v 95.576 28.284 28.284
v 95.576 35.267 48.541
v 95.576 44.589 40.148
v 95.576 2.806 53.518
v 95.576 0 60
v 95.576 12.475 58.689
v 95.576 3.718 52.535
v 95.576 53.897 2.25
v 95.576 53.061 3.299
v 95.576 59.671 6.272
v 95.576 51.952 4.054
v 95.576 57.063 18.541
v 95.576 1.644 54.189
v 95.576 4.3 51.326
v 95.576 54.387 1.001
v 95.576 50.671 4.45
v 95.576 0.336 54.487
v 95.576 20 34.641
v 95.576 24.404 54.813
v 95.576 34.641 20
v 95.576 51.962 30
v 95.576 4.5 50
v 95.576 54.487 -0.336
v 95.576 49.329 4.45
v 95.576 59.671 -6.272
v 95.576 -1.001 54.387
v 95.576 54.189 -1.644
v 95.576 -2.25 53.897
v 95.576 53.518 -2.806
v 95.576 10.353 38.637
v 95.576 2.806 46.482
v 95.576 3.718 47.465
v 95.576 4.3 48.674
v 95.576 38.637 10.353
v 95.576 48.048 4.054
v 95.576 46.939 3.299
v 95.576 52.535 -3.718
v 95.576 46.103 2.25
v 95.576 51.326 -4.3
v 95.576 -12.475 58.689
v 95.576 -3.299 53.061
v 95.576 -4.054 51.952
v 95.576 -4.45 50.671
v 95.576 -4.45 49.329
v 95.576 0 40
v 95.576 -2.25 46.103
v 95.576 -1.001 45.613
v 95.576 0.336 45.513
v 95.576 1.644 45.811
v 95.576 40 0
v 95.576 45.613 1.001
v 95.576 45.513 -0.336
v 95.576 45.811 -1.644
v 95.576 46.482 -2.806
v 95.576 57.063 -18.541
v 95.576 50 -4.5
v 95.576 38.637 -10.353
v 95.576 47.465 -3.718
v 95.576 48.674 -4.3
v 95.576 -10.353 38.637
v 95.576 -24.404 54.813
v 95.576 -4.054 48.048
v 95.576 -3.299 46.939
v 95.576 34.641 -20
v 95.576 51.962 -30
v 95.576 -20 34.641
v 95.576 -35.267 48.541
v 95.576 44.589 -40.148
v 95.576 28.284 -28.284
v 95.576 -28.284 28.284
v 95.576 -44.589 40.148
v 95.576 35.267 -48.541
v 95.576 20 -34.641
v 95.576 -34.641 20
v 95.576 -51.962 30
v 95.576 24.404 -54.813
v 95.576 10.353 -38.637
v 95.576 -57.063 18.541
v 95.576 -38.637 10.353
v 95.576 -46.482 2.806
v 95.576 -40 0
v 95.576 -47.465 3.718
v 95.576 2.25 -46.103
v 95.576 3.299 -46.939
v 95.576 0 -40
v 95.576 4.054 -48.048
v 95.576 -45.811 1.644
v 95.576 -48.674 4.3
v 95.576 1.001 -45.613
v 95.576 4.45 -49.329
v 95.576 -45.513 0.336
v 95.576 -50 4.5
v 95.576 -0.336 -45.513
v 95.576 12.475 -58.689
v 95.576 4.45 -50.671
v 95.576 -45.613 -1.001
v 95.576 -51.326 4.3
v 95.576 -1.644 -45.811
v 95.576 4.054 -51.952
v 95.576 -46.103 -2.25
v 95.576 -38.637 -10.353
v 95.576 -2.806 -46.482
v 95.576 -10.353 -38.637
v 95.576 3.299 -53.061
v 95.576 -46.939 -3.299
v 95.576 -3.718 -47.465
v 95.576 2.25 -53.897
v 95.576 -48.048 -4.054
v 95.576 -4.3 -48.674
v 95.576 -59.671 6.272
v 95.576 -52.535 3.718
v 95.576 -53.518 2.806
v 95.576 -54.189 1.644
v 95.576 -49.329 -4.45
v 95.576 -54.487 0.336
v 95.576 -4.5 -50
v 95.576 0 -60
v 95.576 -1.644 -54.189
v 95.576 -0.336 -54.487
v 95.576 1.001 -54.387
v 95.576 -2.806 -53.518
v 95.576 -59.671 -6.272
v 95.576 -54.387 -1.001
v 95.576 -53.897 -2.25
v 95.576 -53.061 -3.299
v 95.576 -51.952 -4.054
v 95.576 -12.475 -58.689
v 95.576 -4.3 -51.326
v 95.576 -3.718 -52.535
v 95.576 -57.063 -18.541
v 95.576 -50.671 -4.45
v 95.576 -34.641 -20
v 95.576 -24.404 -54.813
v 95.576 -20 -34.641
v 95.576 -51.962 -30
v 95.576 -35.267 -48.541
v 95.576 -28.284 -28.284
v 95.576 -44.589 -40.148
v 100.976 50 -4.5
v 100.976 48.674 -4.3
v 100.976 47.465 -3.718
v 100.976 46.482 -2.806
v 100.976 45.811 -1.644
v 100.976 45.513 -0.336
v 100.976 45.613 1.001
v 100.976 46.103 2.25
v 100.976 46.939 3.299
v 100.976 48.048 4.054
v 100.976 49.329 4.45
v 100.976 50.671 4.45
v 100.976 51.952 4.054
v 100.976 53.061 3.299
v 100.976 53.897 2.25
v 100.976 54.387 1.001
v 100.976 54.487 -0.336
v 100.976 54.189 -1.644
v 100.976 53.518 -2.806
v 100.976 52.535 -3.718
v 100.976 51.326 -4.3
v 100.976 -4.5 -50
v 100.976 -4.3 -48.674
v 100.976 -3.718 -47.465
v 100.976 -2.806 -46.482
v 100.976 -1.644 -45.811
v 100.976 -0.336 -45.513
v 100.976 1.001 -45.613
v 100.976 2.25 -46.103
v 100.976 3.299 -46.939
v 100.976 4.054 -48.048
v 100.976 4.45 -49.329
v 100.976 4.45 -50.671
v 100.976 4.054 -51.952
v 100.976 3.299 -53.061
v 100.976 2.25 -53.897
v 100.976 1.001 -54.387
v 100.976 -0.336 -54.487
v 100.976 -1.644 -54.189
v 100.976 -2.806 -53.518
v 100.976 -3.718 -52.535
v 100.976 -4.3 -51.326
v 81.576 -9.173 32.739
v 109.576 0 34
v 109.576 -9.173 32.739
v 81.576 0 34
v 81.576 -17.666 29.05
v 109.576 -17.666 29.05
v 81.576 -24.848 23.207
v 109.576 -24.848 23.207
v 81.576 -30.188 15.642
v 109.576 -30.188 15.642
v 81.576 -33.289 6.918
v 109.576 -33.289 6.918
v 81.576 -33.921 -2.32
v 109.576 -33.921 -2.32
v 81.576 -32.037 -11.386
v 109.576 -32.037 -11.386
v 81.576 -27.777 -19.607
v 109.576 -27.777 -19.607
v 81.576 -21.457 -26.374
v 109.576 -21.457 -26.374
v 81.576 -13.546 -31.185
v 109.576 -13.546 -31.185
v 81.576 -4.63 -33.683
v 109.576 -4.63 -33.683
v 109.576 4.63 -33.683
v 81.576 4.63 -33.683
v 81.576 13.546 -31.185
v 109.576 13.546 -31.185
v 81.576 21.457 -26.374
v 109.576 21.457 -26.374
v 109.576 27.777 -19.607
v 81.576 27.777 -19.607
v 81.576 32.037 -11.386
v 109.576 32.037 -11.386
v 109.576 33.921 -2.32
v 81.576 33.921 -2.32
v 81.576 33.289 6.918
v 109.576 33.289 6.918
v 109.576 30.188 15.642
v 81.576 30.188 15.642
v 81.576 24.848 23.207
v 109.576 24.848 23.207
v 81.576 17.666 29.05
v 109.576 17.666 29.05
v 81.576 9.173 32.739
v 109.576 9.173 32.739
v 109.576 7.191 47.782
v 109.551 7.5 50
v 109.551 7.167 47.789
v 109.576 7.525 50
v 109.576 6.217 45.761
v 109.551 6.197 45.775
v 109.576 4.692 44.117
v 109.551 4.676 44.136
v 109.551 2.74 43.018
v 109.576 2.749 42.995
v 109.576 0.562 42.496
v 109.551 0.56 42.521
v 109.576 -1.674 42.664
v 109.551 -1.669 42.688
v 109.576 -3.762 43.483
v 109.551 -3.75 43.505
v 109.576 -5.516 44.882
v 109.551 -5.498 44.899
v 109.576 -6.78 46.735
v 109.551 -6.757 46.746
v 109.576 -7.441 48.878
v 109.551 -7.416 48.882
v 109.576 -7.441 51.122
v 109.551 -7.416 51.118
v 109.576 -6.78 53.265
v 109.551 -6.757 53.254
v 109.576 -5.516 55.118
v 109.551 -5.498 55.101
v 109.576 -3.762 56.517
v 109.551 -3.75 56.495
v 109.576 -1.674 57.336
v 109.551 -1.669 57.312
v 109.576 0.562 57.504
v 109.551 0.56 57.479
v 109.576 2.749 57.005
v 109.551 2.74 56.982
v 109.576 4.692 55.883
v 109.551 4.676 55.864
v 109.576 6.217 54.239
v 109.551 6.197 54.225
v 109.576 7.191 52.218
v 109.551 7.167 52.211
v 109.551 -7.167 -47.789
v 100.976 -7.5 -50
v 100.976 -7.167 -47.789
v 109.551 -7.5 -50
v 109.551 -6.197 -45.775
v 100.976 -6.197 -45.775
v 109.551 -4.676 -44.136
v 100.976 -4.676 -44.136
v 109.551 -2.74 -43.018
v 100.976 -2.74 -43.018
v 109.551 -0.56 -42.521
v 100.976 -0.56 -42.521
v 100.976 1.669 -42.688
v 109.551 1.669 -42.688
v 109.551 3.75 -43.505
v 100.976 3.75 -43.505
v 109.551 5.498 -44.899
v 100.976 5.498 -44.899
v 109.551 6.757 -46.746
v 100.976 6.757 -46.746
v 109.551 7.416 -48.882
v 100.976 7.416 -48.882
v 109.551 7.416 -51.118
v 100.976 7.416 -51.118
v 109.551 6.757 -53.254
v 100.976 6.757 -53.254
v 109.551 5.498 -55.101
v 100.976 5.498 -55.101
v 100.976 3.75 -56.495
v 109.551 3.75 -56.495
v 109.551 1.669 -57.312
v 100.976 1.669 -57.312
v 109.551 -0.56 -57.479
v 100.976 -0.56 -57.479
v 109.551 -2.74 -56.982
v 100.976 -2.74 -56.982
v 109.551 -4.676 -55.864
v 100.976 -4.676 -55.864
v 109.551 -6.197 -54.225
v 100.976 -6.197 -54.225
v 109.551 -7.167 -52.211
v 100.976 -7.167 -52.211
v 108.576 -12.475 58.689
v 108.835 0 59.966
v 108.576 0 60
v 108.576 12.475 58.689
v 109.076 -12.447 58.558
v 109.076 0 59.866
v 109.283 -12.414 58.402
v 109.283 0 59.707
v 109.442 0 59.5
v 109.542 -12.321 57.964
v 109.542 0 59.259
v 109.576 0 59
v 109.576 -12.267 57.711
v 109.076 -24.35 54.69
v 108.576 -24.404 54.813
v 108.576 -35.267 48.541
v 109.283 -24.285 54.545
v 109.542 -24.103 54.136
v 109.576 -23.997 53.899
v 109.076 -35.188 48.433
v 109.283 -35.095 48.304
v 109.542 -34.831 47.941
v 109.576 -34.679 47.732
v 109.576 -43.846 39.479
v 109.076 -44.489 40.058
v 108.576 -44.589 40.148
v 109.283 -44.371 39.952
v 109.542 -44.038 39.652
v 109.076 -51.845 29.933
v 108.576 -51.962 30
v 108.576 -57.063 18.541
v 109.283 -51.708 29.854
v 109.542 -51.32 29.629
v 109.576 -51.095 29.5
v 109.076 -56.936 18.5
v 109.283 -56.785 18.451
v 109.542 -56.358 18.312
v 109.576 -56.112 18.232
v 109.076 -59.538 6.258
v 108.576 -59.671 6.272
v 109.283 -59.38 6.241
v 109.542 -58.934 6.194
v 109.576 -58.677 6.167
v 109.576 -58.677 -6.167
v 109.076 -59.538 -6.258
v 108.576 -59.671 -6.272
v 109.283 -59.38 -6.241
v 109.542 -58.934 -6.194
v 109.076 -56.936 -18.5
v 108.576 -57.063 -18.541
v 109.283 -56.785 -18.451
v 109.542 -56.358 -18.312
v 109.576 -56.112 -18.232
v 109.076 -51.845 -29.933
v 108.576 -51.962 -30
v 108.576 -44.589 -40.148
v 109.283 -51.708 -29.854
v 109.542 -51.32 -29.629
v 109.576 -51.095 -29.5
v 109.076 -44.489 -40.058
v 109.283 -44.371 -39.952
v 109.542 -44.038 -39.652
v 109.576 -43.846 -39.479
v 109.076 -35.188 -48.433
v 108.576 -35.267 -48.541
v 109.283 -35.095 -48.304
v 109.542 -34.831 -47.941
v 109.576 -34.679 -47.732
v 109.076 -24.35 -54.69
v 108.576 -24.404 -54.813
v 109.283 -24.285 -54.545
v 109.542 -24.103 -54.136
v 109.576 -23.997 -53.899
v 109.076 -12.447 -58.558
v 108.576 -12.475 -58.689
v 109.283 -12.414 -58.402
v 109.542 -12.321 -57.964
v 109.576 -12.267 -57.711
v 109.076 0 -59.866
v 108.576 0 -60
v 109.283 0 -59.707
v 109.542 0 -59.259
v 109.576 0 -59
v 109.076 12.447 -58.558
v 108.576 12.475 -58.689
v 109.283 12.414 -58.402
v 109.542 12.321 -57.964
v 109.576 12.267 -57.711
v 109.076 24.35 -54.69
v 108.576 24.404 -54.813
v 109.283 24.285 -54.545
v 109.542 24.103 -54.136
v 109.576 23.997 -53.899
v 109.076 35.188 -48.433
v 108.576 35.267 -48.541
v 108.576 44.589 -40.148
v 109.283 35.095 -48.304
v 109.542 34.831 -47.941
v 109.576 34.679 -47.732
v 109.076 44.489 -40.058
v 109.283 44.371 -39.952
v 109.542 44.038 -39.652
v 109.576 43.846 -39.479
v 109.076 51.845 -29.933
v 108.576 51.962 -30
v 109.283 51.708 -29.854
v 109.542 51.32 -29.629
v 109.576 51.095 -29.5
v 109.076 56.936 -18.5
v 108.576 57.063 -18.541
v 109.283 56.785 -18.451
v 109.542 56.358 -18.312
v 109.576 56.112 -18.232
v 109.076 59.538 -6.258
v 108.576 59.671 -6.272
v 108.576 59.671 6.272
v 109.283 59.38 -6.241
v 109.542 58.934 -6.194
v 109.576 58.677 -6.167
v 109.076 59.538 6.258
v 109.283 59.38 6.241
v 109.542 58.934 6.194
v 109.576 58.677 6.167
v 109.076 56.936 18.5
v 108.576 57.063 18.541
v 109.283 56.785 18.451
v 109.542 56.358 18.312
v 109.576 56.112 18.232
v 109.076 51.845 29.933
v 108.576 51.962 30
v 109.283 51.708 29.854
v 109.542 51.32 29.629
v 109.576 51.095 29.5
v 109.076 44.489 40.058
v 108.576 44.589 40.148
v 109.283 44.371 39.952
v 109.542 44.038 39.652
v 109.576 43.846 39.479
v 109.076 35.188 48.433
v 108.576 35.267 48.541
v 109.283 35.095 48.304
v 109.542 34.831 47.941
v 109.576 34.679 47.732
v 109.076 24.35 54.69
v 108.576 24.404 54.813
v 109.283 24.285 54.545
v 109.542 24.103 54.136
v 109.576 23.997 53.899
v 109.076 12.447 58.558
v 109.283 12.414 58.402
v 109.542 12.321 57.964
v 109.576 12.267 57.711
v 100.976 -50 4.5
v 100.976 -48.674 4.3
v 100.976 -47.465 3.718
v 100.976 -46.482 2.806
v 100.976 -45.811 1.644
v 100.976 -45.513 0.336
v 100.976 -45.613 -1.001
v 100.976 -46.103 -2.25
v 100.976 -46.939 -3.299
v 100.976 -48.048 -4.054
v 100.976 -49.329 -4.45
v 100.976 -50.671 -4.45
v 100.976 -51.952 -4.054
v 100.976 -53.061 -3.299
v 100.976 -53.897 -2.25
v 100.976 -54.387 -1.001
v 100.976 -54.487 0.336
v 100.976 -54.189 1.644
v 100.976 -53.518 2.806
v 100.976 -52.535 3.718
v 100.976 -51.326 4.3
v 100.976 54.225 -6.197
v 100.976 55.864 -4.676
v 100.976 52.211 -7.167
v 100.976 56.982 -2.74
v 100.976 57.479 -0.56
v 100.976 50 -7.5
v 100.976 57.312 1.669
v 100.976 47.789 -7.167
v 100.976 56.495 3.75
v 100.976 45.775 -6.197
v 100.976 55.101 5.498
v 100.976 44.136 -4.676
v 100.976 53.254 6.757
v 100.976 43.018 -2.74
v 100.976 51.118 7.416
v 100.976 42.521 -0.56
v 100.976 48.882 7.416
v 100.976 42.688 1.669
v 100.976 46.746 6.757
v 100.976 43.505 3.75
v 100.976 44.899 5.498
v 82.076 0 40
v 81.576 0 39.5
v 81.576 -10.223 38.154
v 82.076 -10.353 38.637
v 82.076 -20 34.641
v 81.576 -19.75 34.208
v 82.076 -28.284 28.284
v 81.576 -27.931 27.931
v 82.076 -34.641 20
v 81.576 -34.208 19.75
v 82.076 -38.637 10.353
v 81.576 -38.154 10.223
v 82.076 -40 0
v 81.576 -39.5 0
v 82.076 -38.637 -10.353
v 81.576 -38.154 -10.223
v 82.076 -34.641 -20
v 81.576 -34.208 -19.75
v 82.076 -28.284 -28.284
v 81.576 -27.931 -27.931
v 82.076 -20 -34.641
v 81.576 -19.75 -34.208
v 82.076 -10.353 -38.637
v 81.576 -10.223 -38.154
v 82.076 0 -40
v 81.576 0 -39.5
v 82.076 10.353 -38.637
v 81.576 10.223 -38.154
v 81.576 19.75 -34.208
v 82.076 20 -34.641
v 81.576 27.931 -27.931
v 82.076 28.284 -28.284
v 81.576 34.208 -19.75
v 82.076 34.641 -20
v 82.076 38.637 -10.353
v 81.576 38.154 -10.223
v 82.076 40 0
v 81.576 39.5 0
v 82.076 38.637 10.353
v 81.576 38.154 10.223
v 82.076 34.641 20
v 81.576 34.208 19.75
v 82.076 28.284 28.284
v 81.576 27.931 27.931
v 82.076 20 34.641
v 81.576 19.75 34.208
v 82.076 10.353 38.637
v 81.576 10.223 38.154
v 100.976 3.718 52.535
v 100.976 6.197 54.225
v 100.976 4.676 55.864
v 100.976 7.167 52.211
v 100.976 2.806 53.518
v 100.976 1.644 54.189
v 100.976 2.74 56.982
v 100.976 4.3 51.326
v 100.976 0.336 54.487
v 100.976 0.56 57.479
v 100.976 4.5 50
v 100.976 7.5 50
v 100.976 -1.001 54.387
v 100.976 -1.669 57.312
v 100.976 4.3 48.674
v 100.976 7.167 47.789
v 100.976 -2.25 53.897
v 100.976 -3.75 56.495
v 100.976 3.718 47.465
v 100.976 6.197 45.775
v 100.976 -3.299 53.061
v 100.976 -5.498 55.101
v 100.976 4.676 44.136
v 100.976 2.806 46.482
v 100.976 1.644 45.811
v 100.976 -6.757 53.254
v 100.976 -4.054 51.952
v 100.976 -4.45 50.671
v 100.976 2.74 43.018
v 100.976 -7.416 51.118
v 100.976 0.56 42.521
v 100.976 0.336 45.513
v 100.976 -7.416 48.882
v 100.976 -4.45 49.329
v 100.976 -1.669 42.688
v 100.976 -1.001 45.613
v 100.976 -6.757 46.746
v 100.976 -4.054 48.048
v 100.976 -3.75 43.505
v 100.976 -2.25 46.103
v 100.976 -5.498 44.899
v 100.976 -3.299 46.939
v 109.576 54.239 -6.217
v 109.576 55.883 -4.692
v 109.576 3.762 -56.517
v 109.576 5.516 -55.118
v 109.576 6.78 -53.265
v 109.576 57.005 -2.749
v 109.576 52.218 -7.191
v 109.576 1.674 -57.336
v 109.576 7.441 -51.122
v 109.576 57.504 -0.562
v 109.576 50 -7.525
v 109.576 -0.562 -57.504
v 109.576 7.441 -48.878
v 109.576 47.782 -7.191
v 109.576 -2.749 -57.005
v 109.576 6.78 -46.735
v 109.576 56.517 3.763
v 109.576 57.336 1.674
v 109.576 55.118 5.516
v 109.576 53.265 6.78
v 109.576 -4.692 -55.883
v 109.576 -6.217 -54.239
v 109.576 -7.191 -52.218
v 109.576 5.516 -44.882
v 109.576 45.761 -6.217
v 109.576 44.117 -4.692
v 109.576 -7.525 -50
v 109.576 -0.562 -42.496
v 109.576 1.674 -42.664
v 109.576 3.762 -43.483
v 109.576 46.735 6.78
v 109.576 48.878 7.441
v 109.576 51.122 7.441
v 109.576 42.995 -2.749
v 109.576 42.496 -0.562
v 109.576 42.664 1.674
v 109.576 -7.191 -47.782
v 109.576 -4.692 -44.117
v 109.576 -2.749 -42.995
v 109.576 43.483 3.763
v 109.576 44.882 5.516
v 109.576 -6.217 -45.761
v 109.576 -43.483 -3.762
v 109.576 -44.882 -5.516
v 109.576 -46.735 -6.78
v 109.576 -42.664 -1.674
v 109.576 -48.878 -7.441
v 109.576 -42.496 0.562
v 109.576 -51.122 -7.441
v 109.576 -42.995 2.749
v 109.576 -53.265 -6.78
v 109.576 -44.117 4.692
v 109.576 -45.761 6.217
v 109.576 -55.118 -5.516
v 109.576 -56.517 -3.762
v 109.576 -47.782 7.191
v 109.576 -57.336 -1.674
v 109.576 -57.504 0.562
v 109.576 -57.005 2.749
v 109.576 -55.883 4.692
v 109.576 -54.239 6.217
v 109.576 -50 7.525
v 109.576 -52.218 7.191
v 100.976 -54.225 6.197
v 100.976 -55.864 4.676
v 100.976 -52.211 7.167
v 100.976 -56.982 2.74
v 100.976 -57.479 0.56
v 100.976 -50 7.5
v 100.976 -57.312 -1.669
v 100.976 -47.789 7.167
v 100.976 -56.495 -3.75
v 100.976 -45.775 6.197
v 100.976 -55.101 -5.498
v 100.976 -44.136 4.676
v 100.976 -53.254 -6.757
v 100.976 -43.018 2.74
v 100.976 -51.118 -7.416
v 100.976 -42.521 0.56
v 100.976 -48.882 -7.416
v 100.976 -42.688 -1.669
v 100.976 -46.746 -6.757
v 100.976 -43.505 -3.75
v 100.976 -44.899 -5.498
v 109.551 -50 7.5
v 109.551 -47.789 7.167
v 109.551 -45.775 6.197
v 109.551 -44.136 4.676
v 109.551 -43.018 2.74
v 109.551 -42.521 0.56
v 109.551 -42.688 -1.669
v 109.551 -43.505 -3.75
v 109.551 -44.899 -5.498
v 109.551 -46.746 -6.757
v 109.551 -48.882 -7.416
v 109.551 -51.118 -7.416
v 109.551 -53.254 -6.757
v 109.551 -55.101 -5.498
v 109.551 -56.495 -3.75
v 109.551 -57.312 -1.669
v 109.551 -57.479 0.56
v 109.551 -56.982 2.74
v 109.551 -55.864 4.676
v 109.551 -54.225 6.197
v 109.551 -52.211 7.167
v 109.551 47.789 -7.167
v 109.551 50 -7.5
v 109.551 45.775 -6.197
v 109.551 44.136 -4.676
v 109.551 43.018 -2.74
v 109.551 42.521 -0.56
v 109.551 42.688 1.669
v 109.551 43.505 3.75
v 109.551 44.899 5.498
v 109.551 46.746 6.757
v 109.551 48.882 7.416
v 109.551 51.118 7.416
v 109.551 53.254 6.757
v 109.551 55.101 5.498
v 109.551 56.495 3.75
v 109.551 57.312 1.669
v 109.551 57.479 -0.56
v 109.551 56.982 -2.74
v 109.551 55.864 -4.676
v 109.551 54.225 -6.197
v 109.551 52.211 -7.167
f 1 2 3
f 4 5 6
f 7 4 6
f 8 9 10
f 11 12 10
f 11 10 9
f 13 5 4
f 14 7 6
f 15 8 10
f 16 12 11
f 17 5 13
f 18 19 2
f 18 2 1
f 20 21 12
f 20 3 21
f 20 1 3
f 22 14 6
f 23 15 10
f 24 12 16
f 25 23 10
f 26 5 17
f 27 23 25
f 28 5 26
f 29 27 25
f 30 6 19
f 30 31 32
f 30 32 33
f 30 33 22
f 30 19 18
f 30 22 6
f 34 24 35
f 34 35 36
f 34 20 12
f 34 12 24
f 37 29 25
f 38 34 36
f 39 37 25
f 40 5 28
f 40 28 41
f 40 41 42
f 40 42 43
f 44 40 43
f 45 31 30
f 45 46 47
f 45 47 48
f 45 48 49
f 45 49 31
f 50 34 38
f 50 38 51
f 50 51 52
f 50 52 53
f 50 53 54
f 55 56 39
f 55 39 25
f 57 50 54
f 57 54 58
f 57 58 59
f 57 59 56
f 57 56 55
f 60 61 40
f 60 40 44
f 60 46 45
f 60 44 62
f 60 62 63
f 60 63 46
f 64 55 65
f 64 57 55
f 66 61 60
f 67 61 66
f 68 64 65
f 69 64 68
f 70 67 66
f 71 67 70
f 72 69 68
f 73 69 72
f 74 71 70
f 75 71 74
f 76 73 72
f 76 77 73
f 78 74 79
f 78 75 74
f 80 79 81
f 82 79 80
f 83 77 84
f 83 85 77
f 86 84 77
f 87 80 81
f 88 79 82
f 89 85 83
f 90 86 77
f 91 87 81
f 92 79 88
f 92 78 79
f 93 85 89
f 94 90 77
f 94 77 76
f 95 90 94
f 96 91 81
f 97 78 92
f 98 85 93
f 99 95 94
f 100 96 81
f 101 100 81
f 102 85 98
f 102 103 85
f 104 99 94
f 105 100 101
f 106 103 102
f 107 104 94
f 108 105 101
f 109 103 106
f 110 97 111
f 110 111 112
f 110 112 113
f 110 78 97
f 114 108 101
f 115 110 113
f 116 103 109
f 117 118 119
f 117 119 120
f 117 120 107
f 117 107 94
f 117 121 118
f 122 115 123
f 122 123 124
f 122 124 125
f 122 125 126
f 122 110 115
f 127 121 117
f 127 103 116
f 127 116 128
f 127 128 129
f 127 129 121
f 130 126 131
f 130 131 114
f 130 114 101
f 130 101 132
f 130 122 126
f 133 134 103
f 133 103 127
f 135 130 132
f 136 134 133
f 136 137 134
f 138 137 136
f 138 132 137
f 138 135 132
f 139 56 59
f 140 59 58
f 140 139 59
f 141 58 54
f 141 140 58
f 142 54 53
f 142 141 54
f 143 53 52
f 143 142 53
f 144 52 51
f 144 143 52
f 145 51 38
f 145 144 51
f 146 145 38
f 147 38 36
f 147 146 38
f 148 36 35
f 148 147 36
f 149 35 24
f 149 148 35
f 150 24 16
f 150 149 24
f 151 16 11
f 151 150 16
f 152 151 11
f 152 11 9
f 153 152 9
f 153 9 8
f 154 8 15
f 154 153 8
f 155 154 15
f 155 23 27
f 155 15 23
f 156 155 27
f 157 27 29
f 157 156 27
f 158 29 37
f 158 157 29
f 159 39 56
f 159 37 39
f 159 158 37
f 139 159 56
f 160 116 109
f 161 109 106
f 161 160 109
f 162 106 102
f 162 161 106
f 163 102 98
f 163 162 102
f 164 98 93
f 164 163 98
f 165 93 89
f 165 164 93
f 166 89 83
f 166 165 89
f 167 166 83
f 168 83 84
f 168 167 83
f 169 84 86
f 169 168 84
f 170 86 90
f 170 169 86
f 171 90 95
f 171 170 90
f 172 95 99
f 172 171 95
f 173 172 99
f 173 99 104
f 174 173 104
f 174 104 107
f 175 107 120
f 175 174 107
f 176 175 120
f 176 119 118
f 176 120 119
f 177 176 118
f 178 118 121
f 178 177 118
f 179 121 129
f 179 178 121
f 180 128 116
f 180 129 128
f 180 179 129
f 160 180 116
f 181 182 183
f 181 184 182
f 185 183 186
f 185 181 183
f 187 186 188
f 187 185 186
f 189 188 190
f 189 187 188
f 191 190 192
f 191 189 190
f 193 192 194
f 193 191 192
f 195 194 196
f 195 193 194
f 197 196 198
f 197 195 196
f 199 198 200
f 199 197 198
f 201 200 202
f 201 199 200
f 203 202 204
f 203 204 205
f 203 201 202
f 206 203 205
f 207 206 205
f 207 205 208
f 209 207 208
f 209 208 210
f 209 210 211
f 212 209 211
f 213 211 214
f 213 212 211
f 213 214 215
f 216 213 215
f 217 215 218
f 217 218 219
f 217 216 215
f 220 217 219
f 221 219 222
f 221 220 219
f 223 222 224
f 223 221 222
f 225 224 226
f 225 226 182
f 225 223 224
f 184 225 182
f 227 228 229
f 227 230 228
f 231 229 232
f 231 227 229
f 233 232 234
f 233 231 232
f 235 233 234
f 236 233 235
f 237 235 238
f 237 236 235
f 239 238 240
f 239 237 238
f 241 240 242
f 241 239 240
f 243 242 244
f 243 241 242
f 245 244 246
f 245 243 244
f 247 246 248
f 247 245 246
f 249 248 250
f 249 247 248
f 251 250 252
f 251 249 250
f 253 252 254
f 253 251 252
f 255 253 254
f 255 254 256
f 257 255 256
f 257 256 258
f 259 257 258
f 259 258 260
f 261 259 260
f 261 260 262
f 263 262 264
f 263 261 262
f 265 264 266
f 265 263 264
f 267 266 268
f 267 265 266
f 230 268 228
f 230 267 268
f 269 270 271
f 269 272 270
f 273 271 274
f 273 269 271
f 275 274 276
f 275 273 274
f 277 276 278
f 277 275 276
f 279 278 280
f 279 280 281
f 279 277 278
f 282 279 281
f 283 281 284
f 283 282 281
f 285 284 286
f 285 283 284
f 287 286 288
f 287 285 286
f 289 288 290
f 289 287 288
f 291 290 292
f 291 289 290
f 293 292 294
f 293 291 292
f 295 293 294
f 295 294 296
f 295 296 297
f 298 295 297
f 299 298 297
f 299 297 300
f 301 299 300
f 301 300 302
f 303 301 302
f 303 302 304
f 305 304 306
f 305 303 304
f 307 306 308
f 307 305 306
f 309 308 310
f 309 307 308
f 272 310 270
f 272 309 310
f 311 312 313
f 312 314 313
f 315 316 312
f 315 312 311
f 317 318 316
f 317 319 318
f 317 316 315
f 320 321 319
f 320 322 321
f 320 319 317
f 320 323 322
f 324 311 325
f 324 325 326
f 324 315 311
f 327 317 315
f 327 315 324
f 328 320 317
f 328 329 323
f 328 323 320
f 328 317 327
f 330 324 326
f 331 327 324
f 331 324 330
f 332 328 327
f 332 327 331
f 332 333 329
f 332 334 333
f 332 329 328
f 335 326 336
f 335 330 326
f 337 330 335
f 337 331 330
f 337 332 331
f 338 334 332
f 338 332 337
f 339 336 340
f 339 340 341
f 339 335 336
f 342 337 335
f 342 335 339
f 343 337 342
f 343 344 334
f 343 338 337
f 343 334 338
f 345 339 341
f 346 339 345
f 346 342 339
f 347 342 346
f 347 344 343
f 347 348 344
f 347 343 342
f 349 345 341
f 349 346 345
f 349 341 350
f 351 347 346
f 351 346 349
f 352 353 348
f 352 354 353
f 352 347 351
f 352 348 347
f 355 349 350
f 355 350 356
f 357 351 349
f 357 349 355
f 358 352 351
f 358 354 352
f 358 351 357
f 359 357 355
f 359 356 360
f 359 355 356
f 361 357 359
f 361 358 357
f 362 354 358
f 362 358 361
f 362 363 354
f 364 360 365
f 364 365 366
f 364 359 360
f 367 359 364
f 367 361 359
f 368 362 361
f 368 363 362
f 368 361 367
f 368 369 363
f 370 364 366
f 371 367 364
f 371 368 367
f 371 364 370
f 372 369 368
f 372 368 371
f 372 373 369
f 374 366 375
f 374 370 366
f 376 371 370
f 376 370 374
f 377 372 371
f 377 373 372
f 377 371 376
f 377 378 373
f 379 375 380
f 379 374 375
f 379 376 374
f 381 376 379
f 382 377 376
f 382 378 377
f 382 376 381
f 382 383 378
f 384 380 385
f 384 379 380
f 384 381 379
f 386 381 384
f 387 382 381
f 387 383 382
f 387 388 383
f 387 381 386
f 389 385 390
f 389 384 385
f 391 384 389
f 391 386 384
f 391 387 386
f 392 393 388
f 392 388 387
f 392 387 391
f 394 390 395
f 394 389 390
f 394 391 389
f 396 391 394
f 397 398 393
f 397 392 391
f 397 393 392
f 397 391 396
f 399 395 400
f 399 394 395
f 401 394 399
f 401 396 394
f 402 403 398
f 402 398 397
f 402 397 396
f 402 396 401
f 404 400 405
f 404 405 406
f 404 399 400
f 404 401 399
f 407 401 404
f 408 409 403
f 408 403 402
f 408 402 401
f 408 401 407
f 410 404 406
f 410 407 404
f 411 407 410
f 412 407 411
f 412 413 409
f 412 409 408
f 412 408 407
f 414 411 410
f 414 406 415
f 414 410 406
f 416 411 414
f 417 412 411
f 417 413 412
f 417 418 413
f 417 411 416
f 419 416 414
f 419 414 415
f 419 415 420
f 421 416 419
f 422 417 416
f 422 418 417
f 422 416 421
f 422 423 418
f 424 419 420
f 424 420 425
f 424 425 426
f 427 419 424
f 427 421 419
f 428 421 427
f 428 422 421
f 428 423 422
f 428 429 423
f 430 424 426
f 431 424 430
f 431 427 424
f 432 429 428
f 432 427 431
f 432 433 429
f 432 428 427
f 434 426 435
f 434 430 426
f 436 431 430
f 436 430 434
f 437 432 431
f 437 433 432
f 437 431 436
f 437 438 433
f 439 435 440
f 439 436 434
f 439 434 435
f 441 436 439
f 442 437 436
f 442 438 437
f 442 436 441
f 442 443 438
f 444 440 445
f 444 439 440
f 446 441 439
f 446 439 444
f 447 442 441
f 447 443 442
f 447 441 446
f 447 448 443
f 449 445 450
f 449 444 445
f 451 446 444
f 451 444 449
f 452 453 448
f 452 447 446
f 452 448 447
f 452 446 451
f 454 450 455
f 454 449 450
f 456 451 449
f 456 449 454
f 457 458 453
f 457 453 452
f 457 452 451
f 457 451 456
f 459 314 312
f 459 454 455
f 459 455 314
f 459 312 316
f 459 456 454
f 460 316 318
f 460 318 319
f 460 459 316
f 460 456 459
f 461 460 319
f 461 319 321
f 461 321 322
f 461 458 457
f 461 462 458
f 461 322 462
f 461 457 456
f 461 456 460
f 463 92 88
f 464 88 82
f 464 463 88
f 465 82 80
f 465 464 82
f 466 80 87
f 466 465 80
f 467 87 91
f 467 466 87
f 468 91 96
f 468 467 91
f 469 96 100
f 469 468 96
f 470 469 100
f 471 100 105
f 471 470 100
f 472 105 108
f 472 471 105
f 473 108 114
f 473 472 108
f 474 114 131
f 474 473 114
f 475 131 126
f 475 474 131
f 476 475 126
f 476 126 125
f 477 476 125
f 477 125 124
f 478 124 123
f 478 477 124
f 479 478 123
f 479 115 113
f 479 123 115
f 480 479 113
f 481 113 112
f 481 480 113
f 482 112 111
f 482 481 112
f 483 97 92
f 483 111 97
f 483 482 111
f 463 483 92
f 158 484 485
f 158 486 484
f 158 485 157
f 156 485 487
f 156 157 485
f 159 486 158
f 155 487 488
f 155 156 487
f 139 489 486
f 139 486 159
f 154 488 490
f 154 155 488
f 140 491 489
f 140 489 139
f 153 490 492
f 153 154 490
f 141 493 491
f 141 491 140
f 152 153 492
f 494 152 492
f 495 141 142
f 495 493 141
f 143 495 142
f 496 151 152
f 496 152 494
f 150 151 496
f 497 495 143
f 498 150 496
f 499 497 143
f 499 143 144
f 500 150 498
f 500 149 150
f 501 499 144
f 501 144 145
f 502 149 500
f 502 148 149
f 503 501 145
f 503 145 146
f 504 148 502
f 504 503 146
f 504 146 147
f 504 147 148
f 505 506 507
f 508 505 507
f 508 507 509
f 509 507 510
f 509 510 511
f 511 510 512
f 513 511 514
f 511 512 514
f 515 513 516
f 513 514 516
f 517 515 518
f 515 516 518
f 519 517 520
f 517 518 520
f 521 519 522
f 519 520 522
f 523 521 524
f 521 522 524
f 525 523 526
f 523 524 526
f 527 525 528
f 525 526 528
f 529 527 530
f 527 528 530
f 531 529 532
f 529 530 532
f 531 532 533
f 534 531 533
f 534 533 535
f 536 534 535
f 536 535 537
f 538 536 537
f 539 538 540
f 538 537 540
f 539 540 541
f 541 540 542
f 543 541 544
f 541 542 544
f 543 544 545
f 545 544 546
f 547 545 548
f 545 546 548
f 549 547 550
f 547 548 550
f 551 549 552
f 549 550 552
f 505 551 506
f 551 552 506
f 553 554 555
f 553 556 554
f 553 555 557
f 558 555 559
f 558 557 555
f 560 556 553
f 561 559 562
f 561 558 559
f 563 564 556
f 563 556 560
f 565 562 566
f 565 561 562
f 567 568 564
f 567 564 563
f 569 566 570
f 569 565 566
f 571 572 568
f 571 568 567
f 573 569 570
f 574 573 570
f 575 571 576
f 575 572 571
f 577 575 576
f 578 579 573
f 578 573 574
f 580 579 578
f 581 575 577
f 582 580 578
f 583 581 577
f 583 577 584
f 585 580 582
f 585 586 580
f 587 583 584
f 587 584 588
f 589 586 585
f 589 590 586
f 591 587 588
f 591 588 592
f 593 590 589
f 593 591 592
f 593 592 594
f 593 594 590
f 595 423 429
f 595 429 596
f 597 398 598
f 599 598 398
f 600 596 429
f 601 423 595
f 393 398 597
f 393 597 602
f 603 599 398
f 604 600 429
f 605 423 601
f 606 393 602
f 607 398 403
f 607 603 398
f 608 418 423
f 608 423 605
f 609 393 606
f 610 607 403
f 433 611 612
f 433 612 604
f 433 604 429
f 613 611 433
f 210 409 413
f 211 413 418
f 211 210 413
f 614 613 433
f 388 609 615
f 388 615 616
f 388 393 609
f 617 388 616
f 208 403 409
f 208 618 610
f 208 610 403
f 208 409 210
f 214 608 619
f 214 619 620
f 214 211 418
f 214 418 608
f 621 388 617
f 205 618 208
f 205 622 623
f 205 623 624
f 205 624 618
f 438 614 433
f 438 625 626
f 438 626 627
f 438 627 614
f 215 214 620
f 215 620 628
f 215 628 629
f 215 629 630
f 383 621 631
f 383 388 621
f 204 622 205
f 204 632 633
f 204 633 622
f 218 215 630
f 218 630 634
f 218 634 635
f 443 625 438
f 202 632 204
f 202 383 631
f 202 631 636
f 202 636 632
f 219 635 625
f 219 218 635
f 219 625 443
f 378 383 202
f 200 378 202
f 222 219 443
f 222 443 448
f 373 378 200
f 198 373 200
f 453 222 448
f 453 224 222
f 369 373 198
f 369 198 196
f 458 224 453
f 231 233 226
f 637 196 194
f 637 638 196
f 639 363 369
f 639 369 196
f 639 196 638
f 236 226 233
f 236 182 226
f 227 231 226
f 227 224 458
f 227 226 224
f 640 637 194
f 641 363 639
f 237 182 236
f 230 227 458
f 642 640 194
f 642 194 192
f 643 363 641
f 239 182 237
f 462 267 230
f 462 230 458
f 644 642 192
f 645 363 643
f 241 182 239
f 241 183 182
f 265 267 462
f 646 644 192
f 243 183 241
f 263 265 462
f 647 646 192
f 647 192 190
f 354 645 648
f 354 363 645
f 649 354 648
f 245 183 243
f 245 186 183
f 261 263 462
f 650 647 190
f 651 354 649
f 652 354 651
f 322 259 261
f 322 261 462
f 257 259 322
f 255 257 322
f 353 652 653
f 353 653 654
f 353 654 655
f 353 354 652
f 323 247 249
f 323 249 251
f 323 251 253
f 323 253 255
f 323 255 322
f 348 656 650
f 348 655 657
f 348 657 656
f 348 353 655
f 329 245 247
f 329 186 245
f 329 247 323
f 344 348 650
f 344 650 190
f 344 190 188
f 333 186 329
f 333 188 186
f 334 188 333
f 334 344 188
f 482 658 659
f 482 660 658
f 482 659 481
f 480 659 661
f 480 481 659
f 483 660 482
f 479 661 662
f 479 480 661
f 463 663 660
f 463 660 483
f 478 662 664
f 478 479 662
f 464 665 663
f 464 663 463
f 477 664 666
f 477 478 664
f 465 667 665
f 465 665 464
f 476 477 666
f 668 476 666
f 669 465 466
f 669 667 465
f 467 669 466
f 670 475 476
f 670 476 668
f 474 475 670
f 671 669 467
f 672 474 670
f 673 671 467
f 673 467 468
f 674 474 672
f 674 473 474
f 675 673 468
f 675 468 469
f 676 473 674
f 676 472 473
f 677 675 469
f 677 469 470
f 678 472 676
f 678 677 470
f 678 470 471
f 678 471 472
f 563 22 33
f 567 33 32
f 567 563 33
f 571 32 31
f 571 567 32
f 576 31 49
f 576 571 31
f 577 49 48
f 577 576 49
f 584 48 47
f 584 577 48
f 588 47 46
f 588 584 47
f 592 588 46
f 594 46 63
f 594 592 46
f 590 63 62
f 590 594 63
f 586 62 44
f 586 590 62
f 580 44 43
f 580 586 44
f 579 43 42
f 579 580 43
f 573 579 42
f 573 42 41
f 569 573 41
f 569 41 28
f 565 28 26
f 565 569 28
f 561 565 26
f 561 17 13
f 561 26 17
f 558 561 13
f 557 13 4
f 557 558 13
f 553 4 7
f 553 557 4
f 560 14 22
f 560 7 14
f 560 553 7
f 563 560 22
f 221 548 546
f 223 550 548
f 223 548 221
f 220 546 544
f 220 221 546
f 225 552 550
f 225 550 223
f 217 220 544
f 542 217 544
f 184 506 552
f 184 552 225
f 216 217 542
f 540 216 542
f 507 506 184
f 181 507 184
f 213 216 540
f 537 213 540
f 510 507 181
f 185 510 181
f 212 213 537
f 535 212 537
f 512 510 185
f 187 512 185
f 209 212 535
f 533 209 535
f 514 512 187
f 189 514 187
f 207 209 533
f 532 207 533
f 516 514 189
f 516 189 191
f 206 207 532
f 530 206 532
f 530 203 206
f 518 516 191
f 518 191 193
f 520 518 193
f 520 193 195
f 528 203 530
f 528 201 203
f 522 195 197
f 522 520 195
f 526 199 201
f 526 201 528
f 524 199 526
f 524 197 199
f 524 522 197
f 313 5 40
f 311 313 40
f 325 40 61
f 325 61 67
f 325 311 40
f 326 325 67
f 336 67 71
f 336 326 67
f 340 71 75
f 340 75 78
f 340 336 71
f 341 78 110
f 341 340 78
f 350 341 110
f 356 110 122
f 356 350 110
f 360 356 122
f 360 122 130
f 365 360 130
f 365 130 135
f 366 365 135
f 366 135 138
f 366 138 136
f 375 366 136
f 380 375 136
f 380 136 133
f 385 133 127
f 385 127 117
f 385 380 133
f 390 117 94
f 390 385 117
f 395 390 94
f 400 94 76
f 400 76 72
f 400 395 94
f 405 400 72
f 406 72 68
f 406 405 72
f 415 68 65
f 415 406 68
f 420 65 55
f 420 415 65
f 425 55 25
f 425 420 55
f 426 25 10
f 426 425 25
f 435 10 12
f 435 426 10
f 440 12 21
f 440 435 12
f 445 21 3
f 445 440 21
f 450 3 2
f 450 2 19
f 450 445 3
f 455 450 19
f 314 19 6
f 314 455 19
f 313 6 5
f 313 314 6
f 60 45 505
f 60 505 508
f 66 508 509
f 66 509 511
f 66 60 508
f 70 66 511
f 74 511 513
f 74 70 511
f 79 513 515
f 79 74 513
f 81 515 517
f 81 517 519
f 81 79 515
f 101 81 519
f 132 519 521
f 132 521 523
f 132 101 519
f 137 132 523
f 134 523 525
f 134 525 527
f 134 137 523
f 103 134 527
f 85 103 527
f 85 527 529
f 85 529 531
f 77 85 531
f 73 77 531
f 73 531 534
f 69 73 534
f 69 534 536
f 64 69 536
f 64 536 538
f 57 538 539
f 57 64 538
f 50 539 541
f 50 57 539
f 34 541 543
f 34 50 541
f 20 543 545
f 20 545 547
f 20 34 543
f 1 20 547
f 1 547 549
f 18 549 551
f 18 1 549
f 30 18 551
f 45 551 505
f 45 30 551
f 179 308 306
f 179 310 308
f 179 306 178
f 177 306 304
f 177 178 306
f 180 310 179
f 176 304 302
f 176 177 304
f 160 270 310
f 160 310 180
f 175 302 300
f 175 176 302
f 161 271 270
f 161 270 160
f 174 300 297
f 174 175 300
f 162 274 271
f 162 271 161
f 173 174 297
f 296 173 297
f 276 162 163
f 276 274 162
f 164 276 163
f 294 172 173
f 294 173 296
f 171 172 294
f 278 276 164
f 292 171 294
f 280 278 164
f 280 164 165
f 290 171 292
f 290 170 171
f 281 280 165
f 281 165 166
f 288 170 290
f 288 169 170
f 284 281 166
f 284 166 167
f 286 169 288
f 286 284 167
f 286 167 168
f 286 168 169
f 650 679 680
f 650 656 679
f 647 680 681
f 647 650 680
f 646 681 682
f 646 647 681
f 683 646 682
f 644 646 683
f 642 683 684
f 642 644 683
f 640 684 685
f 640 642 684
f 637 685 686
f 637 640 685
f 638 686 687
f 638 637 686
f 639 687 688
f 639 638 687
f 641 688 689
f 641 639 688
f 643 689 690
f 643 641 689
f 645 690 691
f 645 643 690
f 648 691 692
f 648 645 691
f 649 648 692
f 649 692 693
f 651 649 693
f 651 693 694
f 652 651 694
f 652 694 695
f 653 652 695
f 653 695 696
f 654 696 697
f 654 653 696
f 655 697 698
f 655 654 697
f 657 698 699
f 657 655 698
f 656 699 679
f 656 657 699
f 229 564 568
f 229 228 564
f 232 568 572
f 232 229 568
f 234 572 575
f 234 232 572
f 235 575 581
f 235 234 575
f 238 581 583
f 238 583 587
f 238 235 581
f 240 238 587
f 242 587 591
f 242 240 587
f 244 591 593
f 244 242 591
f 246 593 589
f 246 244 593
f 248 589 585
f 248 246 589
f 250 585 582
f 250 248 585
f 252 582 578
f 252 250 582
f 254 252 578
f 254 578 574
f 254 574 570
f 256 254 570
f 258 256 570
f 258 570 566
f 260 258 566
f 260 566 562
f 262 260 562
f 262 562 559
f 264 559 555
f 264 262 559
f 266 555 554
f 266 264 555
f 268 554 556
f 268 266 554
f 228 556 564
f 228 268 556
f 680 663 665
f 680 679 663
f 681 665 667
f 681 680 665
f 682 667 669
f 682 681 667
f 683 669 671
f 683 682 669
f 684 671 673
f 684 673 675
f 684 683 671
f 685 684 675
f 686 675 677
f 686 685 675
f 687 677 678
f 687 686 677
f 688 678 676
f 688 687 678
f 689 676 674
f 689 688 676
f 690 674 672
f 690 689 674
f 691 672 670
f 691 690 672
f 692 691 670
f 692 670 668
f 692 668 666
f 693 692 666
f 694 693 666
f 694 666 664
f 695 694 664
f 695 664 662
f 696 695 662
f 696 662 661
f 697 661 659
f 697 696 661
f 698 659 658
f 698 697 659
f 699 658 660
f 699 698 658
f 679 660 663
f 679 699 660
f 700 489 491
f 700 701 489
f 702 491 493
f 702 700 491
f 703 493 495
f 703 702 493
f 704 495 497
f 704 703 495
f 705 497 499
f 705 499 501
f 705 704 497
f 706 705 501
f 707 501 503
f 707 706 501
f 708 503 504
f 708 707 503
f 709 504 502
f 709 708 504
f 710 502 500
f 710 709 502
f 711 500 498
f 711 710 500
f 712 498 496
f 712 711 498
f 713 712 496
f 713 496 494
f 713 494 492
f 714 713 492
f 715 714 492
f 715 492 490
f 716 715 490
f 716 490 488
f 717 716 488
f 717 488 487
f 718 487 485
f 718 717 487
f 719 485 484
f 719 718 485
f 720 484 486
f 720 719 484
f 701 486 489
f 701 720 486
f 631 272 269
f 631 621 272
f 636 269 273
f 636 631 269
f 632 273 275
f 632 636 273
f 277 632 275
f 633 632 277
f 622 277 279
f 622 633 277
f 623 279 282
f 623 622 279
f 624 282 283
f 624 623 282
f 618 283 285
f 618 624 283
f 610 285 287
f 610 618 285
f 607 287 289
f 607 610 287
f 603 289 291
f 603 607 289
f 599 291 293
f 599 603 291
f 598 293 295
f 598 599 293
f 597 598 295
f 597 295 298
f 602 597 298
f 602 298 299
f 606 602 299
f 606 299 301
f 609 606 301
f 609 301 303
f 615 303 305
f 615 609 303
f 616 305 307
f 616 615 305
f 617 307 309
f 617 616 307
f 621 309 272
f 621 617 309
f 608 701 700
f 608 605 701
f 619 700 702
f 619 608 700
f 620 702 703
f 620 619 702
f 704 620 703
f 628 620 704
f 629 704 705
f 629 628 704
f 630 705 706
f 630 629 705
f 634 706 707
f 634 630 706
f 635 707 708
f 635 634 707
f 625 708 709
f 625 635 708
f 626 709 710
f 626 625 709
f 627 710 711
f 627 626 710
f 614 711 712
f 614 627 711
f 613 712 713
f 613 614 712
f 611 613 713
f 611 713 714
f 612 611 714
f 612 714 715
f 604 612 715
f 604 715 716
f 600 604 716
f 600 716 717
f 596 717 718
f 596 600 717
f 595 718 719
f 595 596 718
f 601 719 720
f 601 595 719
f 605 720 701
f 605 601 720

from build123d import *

# Parameters (mm, degrees)
CONG_1_R                     = 1
CHANFREIN1_SIZE              = 0.5
R_P_TITION_CIRCULAIRE1_COUNT = 4


with BuildPart() as part:
    # Esquisse1 → Révolution1 (revolve)
    with BuildSketch(Plane.XY, mode=Mode.PRIVATE) as r_volution1_sk:
        Polygon((81.575845111, 40), (95.575845111, 40), (95.575845111, 60), (109.575845111, 60), (109.575845111, 34), (81.575845111, 34), align=None)
    revolve(r_volution1_sk.sketch.rotate(Axis((0, 0, 0), (1, 0, 0)), 90), axis=Axis((0, 0, 0), (1, 0, 0)))

    # Congé1
    cong_1_edges = [part.edges().sort_by_distance(p)[0] for p in [
        (109.575845111, 0, -60),
    ]]
    fillet(cong_1_edges, radius=CONG_1_R)

    # Chanfrein1
    chanfrein1_edges = [part.edges().sort_by_distance(p)[0] for p in [
        (81.575845111, 0, -40),
    ]]
    chamfer(chanfrein1_edges, length=CHANFREIN1_SIZE)

    # Esquisse6 → Chambrage pour vis à six pans creux M81 (revolve, cut)
    with BuildSketch(Plane(origin=(109.575845111, 50, 0), x_dir=(0, 0, -1), z_dir=(0, 1, 0))):
        Polygon((0, 0), (0, 28), (4.5, 28), (4.5, 8.6), (7.5, 8.6), (7.5, 0.025), (7.525, 0), align=None)
    chambrage_pour_vis_six_pans_creux_m81 = revolve(axis=Axis((115.925845111, 50, 0), (-1, 0, 0)), mode=Mode.SUBTRACT)

    # Répétition circulaire1: Chambrage pour vis à six pans creux M81 ×4 about axis
    r_p_tition_circulaire1_axis = Axis((0, 0, 0), (1, 0, 0))
    for i in range(1, R_P_TITION_CIRCULAIRE1_COUNT):
        add(chambrage_pour_vis_six_pans_creux_m81.rotate(r_p_tition_circulaire1_axis, i * 360 / R_P_TITION_CIRCULAIRE1_COUNT), mode=Mode.SUBTRACT)


solid = part.part
